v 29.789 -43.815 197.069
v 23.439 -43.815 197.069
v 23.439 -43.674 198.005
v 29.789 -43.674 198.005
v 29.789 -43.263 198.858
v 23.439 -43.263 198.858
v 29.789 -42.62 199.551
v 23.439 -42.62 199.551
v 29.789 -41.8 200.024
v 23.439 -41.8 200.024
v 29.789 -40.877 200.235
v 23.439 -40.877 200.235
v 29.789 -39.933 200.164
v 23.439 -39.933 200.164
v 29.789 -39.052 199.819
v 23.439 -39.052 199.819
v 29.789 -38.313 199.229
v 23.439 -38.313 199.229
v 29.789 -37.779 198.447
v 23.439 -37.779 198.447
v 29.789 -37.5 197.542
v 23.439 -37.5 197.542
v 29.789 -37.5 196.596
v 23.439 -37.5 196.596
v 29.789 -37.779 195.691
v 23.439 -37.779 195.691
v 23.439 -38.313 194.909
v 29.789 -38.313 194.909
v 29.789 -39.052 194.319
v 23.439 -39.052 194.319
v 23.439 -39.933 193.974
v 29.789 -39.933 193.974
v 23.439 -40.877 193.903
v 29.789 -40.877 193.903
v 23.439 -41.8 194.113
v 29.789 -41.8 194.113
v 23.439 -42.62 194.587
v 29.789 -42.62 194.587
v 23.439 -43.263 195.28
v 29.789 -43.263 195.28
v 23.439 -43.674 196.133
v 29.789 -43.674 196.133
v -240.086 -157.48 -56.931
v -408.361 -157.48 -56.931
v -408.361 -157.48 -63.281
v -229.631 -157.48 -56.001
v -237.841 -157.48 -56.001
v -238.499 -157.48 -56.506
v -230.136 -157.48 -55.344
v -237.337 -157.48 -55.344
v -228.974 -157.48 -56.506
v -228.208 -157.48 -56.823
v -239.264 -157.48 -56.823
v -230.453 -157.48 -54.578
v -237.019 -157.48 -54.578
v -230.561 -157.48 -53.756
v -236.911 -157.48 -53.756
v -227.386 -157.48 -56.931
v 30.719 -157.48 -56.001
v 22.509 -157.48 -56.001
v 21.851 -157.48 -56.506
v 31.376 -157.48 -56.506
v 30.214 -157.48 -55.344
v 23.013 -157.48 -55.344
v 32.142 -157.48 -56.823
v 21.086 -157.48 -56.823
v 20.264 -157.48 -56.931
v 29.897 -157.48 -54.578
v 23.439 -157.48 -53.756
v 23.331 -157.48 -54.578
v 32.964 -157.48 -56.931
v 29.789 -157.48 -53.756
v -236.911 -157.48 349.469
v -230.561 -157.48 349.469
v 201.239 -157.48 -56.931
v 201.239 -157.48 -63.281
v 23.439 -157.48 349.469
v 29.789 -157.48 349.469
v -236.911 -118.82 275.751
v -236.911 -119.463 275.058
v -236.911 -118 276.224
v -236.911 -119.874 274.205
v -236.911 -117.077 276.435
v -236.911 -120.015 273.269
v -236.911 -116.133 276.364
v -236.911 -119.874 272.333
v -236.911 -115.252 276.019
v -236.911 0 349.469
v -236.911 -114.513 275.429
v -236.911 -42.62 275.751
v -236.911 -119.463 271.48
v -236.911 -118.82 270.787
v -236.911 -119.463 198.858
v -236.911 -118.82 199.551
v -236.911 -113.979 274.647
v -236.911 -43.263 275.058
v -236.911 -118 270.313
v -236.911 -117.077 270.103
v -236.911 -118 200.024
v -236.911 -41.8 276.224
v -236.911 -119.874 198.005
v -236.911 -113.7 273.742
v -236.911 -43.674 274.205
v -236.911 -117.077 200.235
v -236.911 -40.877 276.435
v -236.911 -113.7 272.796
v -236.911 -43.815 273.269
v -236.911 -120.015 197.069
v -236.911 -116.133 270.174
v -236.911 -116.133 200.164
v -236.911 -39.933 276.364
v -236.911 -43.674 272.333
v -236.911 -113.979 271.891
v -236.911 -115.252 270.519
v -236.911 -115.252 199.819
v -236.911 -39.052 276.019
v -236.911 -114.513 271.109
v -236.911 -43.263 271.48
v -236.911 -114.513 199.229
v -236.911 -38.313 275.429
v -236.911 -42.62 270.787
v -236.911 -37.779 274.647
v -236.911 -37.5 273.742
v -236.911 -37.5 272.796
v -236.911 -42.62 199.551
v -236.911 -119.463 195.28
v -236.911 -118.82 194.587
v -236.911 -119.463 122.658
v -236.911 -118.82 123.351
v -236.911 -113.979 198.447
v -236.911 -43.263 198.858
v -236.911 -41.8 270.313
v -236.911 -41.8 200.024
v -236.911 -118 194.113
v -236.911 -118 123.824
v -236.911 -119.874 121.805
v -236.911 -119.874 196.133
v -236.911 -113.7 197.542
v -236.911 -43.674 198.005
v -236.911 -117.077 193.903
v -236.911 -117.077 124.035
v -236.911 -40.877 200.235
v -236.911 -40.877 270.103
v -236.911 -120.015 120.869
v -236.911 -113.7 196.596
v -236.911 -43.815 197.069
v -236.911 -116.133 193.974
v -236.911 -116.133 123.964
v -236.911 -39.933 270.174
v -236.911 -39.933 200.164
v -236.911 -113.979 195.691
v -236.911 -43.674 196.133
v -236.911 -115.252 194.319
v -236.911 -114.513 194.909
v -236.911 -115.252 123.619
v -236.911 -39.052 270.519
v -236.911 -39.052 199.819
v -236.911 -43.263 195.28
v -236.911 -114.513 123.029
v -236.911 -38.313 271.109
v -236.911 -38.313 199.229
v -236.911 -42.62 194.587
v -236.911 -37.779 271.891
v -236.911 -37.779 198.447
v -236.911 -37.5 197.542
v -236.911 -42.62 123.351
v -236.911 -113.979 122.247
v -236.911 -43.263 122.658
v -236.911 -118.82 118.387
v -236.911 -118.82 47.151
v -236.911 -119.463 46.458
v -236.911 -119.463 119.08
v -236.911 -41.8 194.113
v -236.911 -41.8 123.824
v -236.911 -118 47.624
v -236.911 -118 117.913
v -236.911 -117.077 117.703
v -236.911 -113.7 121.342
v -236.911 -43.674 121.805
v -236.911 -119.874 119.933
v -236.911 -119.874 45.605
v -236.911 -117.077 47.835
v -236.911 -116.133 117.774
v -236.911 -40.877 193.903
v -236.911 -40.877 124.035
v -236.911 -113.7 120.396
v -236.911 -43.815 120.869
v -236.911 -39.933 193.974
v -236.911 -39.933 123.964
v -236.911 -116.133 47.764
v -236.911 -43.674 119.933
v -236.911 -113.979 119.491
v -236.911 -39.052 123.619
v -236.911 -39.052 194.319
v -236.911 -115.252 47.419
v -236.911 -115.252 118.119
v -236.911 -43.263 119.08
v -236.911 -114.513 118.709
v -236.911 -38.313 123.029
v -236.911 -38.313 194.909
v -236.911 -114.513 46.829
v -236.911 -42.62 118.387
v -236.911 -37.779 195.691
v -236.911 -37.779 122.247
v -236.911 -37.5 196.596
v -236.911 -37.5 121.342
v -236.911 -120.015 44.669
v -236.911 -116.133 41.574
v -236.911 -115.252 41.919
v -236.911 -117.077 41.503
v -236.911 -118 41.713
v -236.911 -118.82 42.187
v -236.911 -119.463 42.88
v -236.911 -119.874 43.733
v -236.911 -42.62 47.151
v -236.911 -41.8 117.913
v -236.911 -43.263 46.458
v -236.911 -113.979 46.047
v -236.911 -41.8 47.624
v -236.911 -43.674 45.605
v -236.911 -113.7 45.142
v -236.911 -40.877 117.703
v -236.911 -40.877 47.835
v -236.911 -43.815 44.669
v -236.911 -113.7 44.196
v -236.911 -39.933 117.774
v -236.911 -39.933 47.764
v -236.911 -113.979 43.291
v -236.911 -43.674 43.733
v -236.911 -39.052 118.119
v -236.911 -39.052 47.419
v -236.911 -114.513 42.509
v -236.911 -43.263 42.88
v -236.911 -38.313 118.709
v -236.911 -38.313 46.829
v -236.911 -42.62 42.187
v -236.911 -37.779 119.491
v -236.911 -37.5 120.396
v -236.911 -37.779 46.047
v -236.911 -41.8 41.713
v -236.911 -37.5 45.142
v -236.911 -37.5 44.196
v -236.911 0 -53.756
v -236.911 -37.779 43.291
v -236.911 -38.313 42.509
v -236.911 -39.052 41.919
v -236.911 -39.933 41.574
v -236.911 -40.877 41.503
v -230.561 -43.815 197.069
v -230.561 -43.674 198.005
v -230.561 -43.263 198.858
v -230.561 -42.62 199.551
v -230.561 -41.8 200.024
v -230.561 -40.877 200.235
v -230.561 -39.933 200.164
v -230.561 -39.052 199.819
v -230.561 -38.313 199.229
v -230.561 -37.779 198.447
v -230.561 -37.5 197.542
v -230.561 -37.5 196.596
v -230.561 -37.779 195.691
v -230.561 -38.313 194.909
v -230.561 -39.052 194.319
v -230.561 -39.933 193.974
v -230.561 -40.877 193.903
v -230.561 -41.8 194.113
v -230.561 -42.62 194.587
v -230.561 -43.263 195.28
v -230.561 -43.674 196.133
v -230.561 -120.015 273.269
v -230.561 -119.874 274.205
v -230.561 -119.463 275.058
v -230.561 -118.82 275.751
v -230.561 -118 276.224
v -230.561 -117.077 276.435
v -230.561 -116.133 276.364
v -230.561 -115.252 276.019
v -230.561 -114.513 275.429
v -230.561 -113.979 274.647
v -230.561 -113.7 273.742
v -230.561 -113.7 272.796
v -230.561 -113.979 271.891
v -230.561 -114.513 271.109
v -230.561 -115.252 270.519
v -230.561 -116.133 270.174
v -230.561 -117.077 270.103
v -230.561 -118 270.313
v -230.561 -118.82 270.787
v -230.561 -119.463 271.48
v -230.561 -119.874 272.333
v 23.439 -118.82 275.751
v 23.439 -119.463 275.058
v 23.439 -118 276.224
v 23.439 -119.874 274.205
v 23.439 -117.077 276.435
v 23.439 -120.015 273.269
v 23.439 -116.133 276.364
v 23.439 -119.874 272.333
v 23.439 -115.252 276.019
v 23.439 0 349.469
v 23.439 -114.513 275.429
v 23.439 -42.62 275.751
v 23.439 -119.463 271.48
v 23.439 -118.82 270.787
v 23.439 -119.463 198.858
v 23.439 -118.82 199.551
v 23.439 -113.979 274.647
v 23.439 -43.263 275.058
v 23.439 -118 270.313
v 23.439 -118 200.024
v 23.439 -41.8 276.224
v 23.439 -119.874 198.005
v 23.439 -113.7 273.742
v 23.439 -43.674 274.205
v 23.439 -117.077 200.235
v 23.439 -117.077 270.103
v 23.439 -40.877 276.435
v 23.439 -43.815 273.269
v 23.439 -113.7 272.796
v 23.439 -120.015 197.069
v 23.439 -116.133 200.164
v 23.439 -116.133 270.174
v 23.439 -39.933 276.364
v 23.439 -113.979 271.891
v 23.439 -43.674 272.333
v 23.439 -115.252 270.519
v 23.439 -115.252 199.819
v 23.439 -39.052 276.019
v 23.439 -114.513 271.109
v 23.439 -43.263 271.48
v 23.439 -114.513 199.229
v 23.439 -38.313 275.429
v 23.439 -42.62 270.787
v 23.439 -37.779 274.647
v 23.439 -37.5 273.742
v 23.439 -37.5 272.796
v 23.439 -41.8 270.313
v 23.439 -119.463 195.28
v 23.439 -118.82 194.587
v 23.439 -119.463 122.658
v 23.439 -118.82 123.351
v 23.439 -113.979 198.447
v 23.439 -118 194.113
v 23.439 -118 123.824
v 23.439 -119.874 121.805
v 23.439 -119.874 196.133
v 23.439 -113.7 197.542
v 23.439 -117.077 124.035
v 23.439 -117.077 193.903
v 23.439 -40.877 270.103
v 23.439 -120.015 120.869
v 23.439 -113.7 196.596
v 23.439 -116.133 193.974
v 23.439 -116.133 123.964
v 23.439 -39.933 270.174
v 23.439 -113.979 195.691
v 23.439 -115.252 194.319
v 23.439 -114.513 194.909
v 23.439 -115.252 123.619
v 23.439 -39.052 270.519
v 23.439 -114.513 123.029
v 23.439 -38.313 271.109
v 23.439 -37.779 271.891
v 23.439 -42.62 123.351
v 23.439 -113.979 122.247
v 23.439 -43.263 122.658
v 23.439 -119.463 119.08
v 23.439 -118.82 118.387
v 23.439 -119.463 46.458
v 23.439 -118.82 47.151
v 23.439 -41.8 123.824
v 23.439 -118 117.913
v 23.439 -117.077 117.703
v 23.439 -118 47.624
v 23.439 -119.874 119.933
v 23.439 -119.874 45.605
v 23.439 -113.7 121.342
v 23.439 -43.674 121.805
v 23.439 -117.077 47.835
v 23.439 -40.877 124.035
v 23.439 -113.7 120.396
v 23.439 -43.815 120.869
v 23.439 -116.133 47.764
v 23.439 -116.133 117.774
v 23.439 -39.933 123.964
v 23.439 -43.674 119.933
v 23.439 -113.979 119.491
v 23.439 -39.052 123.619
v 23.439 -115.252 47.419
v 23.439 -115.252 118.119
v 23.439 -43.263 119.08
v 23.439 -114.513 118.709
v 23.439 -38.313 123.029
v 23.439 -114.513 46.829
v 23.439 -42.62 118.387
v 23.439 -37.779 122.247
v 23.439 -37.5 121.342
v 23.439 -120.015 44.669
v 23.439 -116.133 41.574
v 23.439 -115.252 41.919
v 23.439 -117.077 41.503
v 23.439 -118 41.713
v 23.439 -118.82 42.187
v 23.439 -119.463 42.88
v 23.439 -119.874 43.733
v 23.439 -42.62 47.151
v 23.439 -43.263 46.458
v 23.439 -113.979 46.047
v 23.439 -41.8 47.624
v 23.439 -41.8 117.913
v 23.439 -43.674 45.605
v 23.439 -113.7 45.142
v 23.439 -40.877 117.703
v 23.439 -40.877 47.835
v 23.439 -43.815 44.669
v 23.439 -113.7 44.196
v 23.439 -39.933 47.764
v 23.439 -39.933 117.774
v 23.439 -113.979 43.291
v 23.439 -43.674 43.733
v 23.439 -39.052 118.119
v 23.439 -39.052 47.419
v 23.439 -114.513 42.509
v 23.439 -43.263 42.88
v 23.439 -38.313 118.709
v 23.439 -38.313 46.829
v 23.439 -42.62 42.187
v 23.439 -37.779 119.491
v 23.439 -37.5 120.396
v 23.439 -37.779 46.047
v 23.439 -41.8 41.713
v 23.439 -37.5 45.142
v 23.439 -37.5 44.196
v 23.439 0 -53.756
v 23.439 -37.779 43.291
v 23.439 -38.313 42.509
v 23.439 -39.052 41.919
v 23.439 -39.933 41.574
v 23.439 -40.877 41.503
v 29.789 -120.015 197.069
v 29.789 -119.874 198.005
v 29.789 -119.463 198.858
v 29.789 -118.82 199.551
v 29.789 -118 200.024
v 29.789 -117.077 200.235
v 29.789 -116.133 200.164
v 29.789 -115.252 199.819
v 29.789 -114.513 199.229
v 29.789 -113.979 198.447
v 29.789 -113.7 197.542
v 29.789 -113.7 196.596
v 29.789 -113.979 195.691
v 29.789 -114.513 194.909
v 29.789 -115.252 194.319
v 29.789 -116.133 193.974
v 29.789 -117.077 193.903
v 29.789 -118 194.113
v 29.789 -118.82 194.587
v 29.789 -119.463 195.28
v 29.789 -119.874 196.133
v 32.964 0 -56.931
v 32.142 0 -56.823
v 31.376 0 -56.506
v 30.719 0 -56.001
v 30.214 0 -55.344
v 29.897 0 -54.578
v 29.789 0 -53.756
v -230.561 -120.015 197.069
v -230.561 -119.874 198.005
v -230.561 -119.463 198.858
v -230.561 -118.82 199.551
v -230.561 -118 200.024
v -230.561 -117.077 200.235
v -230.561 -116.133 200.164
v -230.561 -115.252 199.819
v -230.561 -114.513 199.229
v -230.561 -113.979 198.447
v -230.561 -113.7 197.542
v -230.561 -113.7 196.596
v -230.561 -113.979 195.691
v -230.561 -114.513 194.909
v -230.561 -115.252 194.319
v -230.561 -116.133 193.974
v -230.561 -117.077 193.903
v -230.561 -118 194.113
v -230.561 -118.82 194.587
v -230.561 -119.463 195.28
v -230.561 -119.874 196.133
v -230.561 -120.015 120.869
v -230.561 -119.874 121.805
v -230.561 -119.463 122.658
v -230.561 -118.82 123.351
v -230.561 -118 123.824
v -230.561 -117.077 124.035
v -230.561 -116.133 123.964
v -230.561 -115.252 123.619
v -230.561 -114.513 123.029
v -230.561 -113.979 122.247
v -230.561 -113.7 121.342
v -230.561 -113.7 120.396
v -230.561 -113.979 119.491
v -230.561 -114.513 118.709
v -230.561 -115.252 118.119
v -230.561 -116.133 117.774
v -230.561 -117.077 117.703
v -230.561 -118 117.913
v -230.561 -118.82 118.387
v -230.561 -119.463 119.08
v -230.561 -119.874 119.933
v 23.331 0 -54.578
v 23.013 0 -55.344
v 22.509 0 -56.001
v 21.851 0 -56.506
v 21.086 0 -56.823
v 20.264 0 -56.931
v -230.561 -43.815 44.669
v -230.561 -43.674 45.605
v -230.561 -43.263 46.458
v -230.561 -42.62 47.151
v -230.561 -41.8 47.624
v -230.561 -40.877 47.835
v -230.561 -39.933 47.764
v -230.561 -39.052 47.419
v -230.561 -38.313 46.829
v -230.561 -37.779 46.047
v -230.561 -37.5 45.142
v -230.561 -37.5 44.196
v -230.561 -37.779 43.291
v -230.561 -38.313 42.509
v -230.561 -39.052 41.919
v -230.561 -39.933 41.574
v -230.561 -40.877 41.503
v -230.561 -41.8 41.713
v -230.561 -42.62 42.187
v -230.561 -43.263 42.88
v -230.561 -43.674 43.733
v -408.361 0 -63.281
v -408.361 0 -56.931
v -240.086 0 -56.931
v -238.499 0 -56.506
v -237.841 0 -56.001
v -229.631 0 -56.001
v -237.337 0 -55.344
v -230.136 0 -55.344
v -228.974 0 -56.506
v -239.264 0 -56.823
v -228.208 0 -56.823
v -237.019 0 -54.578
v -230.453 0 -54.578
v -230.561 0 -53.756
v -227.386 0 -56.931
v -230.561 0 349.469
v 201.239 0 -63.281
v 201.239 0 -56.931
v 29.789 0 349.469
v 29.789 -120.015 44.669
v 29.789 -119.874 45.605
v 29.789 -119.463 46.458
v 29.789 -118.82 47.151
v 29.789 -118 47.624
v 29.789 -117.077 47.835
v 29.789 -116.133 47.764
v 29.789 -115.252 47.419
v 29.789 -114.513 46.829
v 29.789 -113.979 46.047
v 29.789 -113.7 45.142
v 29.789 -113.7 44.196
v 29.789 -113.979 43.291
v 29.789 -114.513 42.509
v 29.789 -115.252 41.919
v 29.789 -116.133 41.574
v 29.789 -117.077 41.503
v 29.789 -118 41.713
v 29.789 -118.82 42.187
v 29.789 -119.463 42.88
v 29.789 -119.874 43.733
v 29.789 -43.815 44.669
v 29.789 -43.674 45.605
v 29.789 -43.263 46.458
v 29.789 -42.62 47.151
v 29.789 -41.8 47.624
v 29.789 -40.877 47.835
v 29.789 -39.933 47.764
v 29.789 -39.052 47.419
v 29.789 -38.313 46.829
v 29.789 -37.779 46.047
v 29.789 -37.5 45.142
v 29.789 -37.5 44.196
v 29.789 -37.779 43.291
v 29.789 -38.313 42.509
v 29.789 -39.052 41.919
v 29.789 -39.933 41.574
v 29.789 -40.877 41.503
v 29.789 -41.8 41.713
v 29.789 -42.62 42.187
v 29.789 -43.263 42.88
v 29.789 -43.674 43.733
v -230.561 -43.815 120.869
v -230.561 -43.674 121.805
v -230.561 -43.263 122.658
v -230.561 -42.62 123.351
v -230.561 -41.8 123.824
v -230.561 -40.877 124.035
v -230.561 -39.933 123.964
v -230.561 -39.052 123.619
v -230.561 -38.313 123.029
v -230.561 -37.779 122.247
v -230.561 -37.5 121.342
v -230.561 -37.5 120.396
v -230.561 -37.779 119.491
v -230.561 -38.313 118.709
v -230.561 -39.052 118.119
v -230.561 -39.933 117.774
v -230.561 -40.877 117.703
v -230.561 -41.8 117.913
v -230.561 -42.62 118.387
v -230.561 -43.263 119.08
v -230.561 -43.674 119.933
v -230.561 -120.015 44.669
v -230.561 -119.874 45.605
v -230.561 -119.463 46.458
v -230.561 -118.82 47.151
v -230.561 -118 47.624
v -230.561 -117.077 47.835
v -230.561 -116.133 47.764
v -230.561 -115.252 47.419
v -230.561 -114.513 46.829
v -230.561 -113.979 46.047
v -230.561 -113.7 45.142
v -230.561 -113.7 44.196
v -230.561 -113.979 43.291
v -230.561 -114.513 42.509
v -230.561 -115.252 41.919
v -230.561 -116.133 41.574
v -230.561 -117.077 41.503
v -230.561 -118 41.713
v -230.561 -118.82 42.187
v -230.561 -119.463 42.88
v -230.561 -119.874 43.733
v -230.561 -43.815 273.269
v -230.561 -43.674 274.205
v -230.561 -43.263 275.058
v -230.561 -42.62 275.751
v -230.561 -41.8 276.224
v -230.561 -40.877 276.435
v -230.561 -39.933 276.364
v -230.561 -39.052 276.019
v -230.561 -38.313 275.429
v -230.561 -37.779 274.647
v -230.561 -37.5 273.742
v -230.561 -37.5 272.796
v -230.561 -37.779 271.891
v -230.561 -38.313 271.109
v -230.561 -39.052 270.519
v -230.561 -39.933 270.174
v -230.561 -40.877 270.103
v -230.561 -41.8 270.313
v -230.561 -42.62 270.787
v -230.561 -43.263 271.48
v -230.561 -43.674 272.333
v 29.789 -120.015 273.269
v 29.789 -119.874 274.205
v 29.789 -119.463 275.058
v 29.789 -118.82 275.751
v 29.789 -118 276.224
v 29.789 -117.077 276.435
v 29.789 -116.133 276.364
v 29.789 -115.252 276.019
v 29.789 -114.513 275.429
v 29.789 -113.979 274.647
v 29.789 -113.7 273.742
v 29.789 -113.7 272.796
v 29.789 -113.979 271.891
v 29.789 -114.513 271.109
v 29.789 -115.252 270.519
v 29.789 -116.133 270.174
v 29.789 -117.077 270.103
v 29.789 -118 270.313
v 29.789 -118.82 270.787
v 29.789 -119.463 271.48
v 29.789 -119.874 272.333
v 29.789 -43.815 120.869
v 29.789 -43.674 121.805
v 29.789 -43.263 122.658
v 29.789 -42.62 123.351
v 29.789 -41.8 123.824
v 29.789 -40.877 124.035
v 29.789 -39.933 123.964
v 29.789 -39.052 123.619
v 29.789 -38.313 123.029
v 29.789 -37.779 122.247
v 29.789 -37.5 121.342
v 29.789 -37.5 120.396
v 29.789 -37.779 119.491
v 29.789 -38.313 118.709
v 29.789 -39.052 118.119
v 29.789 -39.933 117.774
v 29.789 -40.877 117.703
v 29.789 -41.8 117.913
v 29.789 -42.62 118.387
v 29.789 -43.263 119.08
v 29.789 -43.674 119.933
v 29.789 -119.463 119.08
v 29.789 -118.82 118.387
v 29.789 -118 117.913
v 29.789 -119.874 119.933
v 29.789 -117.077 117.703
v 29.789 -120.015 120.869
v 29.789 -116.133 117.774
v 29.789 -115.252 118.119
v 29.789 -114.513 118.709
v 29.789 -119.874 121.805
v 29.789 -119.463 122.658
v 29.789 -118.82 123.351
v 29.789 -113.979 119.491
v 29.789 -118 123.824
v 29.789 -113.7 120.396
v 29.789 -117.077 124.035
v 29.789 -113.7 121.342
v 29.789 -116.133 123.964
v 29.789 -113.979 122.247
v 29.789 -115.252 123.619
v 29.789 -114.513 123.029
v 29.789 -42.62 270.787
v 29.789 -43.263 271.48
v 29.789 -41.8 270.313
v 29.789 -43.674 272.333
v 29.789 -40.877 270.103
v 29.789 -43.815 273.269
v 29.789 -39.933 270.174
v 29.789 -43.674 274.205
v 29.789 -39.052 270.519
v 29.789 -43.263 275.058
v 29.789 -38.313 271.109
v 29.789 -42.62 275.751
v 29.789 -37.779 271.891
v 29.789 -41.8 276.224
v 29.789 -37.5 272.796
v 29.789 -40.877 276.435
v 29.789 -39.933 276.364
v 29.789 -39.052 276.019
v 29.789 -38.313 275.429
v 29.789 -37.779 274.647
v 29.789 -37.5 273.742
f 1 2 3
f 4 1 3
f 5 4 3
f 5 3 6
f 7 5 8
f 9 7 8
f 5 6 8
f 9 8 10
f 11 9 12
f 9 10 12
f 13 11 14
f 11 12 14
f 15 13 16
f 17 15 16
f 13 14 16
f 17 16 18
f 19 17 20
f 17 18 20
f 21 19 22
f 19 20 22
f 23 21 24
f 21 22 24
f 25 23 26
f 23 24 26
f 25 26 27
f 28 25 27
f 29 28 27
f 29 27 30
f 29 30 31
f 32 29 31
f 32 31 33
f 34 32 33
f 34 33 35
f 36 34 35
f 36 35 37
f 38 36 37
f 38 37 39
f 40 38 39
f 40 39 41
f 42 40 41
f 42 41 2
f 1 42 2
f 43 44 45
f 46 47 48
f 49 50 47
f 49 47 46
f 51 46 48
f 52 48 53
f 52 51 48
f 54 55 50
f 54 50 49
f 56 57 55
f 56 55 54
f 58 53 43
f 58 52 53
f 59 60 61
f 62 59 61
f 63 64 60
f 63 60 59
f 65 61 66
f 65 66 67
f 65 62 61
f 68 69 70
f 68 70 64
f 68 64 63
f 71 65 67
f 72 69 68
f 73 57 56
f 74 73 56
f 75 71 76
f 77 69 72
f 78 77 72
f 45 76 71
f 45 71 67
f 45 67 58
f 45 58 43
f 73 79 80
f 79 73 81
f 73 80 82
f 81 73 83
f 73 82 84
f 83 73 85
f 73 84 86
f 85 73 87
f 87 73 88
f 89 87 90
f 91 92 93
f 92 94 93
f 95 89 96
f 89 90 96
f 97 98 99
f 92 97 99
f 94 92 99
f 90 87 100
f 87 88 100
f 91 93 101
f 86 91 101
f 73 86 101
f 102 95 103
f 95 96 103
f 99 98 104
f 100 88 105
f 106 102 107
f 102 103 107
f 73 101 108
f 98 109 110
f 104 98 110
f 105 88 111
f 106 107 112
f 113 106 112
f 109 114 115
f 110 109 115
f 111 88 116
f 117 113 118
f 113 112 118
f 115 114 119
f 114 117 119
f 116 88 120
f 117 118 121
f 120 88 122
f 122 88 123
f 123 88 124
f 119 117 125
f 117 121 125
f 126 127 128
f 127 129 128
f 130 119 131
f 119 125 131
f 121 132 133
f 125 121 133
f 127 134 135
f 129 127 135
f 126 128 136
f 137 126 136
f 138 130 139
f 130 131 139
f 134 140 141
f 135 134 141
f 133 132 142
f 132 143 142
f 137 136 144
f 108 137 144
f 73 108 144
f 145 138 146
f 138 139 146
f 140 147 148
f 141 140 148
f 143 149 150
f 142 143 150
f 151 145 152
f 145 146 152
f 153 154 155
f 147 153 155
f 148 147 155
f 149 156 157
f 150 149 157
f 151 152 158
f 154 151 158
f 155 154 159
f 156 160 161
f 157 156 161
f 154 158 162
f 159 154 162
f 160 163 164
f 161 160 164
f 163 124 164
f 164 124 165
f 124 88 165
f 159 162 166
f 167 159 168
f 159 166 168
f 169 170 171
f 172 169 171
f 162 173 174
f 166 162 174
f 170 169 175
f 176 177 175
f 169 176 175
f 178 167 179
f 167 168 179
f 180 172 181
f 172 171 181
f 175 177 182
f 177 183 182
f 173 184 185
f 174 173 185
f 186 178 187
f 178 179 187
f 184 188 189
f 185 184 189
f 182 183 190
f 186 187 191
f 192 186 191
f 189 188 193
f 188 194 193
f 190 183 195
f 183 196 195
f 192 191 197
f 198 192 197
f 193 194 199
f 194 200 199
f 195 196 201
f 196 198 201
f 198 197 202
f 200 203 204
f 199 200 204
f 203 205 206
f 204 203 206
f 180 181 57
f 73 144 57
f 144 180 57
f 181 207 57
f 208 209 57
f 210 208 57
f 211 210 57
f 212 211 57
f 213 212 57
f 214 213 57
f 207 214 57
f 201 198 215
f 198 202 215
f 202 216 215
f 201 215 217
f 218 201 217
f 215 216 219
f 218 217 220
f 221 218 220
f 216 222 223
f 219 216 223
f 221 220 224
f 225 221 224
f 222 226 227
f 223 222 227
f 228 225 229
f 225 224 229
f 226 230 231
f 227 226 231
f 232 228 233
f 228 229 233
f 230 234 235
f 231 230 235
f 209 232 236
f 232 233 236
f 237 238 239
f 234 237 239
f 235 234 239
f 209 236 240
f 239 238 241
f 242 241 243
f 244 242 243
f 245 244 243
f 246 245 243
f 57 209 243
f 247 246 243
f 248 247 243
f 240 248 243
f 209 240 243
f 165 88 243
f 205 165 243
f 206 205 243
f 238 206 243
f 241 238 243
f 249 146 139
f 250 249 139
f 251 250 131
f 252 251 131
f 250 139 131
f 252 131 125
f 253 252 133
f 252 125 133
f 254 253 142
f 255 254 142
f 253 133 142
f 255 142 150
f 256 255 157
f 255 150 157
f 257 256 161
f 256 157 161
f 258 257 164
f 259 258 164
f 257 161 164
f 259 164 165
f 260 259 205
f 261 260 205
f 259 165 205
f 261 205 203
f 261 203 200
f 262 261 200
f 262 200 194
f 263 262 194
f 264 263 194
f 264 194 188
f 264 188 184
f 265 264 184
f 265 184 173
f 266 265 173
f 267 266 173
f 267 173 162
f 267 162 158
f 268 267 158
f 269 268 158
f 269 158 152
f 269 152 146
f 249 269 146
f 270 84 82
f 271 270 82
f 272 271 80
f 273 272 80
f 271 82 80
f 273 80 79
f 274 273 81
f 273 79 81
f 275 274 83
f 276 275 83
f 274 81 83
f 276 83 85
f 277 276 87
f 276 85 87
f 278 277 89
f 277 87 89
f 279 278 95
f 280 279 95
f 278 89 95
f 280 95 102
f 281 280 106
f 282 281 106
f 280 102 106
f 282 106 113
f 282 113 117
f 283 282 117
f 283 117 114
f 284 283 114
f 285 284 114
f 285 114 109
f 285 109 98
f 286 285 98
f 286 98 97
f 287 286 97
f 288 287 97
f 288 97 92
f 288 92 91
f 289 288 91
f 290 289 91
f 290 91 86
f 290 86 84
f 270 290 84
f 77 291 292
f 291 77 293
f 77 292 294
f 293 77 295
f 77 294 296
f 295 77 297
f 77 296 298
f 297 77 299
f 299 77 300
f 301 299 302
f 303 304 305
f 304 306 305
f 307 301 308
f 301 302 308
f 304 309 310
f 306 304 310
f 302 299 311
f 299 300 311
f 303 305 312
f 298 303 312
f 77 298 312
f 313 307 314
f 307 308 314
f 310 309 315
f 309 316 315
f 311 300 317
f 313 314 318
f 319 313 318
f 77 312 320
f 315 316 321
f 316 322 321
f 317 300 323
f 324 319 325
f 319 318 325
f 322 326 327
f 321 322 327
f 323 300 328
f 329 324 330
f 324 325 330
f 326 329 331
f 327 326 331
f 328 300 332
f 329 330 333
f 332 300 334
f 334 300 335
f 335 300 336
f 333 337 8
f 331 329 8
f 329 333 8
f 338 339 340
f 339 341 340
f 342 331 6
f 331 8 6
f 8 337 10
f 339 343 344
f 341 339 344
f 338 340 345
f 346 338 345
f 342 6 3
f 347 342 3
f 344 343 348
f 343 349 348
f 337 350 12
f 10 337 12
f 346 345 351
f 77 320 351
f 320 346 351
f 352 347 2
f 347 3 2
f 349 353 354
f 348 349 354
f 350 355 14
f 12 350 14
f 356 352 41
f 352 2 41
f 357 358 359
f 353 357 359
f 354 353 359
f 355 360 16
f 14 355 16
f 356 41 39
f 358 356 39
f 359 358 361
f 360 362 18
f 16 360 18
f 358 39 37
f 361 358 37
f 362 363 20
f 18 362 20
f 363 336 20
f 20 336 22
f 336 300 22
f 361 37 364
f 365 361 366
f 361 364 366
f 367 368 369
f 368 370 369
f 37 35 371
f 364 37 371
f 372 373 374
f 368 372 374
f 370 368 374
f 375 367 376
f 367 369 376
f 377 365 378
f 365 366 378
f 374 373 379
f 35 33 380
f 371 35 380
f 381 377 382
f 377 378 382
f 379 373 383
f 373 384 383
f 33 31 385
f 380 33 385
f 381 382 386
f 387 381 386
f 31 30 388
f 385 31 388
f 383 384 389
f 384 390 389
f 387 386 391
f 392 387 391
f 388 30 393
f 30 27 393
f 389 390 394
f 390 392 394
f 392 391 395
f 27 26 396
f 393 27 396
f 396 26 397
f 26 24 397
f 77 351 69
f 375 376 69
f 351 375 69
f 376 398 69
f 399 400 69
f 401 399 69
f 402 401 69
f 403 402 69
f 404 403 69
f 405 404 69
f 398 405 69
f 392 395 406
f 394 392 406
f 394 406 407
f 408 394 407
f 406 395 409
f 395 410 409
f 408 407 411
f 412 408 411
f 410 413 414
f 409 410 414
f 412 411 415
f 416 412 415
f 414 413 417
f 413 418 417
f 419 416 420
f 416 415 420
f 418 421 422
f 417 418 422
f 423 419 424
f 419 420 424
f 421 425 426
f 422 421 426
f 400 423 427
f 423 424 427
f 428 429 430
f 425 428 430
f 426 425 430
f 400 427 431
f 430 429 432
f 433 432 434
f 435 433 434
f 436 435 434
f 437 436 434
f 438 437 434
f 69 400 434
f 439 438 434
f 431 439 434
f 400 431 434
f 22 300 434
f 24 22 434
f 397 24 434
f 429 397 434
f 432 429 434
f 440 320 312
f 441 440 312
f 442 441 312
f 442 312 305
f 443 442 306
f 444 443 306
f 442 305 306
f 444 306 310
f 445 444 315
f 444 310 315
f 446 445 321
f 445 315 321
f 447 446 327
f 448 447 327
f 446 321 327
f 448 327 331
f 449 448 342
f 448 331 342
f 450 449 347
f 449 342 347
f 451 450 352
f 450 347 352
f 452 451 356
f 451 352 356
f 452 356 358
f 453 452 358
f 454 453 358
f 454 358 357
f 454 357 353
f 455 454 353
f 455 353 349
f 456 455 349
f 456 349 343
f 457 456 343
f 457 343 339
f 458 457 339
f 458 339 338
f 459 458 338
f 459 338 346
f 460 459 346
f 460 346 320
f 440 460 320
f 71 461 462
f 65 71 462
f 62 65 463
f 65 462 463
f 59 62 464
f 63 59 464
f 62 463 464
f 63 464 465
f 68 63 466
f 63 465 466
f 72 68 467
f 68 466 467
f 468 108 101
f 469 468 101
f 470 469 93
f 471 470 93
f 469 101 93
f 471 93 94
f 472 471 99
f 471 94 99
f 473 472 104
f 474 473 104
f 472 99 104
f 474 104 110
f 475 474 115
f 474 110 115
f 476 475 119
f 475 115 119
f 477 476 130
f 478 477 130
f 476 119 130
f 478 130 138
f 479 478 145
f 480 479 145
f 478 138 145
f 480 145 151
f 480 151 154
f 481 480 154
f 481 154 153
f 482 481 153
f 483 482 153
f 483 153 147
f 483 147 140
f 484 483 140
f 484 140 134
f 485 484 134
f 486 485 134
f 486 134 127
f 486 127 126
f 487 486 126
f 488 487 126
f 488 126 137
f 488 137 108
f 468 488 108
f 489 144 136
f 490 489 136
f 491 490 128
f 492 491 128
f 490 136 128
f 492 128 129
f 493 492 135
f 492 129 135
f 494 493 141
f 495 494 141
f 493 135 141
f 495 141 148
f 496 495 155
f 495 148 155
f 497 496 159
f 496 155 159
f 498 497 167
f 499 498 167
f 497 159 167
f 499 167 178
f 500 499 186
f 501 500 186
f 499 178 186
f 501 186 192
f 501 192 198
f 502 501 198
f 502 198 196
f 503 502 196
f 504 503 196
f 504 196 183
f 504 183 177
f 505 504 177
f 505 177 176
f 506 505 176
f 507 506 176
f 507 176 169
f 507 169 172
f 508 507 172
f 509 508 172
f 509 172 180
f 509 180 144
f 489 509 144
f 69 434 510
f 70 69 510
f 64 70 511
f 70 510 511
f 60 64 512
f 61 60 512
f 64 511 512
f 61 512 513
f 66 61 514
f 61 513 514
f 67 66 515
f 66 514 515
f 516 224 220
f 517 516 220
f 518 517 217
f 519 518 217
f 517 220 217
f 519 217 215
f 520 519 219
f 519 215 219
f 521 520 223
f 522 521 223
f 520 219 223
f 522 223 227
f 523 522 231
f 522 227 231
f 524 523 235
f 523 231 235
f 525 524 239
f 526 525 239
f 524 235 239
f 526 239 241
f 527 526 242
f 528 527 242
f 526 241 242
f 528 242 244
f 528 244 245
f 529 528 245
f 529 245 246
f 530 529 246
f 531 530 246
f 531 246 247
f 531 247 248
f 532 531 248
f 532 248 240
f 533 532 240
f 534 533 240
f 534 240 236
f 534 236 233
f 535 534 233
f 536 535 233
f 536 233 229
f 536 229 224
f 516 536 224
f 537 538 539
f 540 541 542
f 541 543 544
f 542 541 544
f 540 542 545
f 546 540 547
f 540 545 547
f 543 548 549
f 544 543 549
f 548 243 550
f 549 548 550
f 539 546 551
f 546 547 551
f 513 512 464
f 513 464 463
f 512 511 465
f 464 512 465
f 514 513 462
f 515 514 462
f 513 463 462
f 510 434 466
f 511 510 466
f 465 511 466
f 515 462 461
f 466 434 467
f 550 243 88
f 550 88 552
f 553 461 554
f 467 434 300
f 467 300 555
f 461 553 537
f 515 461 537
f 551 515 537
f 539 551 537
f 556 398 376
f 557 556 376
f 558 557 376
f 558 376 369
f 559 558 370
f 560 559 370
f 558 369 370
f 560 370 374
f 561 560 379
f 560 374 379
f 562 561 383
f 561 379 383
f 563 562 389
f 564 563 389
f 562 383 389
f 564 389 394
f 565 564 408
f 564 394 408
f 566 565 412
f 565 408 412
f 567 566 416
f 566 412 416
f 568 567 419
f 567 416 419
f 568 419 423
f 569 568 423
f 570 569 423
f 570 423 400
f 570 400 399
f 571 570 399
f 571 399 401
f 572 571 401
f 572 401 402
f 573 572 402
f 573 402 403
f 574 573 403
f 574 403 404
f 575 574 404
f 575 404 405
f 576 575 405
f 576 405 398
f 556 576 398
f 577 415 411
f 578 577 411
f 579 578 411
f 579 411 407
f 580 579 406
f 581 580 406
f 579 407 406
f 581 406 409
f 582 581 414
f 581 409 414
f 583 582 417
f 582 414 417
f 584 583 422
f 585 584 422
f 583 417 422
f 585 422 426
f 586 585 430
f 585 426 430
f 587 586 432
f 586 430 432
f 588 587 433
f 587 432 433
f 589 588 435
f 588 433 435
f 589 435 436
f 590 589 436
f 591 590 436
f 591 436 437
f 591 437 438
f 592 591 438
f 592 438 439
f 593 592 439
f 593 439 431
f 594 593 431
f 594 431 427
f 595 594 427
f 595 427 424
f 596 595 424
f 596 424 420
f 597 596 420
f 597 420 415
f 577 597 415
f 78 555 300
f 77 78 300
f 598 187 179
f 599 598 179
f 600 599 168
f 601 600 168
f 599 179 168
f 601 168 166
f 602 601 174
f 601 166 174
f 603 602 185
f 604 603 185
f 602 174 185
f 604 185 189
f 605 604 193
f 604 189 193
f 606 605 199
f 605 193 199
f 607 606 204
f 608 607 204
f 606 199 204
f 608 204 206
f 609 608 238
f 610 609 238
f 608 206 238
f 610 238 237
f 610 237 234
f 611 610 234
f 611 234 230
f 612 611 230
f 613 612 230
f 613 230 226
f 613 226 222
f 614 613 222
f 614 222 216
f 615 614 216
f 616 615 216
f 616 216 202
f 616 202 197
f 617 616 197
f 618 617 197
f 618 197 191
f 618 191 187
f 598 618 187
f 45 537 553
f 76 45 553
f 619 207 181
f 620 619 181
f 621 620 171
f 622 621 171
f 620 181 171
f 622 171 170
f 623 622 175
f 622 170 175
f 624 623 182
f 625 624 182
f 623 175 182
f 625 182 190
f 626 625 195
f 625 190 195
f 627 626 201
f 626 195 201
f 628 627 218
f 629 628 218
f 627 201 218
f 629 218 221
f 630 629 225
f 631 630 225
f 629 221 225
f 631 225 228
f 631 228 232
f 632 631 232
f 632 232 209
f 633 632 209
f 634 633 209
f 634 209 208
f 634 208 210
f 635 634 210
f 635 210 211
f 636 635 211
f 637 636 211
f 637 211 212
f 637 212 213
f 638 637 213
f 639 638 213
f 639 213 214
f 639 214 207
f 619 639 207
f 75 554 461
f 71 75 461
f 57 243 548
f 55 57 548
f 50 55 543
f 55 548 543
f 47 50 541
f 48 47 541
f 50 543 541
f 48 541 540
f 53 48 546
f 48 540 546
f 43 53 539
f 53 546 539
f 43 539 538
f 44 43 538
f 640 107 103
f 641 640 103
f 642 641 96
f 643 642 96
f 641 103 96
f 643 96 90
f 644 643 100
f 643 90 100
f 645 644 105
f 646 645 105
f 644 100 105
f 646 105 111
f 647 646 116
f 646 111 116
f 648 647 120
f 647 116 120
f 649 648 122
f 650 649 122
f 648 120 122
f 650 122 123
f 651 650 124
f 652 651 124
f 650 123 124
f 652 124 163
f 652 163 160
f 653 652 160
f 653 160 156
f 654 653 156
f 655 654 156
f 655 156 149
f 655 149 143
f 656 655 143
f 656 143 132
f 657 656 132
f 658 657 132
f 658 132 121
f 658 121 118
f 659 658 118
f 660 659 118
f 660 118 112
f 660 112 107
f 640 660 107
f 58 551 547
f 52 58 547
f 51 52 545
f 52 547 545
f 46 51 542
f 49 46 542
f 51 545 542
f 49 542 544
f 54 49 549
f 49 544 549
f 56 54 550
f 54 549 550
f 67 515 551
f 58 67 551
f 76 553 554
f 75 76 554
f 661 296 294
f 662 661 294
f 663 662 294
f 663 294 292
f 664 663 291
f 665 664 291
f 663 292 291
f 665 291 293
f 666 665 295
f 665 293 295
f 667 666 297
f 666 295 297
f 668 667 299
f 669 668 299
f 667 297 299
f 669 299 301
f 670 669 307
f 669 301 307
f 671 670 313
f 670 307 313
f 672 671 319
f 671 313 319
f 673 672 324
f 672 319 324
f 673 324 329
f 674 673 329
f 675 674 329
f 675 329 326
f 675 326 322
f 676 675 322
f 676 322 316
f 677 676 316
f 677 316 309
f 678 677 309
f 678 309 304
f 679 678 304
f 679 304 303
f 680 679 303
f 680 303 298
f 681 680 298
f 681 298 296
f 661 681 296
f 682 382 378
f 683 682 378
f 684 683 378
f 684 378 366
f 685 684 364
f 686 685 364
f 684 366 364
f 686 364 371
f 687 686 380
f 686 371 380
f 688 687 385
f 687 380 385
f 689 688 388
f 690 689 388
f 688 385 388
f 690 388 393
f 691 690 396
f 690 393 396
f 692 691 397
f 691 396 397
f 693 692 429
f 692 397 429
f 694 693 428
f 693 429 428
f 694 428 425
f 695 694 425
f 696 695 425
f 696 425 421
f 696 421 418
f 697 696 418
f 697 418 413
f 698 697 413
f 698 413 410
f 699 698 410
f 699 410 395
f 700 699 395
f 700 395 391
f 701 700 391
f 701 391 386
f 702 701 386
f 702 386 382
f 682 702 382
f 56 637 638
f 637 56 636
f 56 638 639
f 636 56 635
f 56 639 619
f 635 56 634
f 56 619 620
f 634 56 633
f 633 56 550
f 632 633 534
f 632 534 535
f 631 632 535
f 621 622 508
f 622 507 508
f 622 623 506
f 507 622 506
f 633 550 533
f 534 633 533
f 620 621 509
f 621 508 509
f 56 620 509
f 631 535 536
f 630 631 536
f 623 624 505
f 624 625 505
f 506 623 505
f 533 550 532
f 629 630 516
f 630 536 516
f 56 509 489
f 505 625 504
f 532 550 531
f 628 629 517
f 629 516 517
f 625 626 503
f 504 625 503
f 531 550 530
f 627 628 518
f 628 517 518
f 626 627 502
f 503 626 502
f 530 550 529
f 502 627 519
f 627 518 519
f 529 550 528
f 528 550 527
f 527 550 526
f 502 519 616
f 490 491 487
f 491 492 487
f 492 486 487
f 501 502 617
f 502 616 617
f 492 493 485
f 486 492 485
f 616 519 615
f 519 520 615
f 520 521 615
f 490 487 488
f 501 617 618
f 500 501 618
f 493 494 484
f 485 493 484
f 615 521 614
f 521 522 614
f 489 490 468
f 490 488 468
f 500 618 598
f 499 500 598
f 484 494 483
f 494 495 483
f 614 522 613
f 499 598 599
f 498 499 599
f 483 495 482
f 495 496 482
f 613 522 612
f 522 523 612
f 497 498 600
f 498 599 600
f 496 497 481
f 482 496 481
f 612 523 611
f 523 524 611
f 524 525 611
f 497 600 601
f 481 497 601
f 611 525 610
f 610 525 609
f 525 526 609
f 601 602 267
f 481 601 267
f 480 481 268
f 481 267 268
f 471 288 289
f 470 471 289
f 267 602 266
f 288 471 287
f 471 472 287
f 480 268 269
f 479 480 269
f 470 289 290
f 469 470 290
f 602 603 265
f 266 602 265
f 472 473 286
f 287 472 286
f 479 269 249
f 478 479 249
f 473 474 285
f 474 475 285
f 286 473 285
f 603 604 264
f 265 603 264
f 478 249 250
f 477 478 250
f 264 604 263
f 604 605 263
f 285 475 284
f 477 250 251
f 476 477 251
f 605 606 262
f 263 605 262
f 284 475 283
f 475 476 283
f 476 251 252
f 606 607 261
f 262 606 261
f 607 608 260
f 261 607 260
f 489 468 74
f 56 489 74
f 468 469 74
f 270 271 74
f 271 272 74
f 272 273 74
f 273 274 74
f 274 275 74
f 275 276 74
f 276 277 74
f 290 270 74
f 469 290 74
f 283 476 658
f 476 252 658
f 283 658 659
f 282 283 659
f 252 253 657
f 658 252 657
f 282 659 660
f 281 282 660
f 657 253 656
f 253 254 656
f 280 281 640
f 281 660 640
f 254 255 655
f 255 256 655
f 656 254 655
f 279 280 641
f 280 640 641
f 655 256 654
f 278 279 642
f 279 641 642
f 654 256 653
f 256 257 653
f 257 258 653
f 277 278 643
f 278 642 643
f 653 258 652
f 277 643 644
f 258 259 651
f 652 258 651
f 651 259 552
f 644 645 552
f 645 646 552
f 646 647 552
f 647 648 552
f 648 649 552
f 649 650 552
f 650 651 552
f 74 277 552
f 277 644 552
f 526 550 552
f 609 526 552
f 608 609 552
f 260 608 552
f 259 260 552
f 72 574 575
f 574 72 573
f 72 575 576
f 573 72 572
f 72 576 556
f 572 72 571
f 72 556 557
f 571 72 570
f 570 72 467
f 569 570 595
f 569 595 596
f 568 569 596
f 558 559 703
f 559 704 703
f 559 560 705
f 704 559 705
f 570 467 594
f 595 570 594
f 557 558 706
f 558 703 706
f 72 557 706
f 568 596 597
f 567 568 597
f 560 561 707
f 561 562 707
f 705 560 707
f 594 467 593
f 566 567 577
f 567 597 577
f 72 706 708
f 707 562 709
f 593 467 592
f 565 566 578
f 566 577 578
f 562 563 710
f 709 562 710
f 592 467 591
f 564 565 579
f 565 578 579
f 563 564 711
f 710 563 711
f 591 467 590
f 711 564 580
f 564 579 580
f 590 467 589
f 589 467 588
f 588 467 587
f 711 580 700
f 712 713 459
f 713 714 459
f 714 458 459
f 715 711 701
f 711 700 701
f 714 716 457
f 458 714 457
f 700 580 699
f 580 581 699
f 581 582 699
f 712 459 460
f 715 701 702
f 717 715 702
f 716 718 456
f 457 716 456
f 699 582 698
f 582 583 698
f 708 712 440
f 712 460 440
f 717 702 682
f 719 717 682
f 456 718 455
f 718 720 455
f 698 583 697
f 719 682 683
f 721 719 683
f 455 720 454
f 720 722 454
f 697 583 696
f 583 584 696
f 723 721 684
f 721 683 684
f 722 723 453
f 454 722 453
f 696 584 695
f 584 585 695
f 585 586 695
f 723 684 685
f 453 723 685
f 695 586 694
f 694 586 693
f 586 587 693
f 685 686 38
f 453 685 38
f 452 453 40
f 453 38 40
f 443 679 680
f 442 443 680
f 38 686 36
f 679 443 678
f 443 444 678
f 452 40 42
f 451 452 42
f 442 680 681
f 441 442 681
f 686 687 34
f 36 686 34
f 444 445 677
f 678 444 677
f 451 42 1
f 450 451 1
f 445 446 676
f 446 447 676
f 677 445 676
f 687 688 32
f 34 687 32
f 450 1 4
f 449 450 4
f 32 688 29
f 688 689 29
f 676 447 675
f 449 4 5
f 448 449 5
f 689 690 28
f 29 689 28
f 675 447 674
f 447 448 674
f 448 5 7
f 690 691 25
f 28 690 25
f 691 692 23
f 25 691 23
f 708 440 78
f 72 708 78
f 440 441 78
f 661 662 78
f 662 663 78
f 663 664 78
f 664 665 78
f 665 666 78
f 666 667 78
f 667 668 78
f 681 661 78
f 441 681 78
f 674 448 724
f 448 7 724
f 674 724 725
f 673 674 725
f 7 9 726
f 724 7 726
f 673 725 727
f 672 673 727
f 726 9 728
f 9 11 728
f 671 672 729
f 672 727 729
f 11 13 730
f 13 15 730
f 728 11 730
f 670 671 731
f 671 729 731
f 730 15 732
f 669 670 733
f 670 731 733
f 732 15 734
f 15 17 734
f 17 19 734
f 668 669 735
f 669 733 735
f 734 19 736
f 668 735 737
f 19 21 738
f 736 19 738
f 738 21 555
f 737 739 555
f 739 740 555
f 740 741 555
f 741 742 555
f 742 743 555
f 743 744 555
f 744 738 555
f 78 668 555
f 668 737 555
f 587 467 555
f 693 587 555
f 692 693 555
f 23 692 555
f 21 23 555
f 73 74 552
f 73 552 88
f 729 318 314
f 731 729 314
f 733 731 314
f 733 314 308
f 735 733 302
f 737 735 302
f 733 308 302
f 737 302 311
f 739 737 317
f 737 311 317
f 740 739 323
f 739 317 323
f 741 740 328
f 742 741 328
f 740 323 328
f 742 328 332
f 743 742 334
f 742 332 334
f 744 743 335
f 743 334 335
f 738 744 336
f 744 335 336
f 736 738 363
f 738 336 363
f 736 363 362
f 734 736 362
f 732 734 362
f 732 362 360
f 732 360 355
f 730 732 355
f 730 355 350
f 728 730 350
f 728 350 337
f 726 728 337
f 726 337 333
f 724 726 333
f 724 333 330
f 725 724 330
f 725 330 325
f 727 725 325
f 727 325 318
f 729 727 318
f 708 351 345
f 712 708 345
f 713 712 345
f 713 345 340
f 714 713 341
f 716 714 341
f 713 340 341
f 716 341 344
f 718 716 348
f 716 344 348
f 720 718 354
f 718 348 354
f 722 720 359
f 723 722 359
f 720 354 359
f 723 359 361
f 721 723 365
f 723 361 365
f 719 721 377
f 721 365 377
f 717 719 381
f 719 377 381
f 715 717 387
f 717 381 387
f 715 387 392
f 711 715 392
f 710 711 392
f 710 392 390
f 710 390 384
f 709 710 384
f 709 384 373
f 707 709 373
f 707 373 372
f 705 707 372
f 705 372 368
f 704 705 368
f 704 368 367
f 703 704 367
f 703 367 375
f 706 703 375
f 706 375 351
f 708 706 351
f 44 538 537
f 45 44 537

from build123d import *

# Parameters (mm, degrees)
F1_DEPTH = 157.48
F2_R     = 3.175
F3_DEPTH = 438.151


with BuildPart() as f1:
    # F0 (on Front) → F1 (new body)
    with BuildSketch(Plane.XZ):
        with BuildLine():
            Line((-103.561188, -56.931033), (-103.561188, -63.281033))
            Line((-103.561188, -63.281033), (201.238812, -63.281033))
            Line((201.238812, -63.281033), (201.238812, -56.931033))
            Line((201.238812, -56.931033), (32.963812, -56.931033))
            ThreePointArc((32.963812, -56.931033), (30.718748, -56.001097), (29.788812, -53.756033))
            Line((29.788812, -53.756033), (29.788812, 349.468967))
            Line((29.788812, 349.468967), (23.438812, 349.468967))
            Line((23.438812, 349.468967), (23.438812, -53.756033))
            ThreePointArc((23.438812, -53.756033), (22.508876, -56.001097), (20.263812, -56.931033))
            Line((20.263812, -56.931033), (-103.561188, -56.931033))
        make_face()
        with BuildLine():
            Line((-408.361188, -63.281033), (-103.561188, -63.281033))
            Line((-103.561188, -63.281033), (-103.561188, -56.931033))
            Line((-103.561188, -56.931033), (-227.386188, -56.931033))
            ThreePointArc((-227.386188, -56.931033), (-229.631252, -56.001097), (-230.561188, -53.756033))
            Line((-230.561188, -53.756033), (-230.561188, 349.468967))
            Line((-230.561188, 349.468967), (-236.911188, 349.468967))
            Line((-236.911188, 349.468967), (-236.911188, -53.756033))
            ThreePointArc((-236.911188, -53.756033), (-237.841124, -56.001097), (-240.086188, -56.931033))
            Line((-240.086188, -56.931033), (-408.361188, -56.931033))
            Line((-408.361188, -56.931033), (-408.361188, -63.281033))
        make_face()
    extrude(amount=F1_DEPTH)

    # F2 (on face) → F3 (cut, through all)
    with BuildSketch(Plane(origin=(-236.911188, 0, 0), x_dir=(0, -1, 0), z_dir=(-1, 0, 0))):
        with Locations((40.64, 273.268967)):
            Circle(F2_R)
        with Locations((40.64, 197.068967)):
            Circle(F2_R)
        with Locations((40.64, 120.868967)):
            Circle(F2_R)
        with Locations((40.64, 44.668967)):
            Circle(F2_R)
        with Locations((116.84, 44.668967)):
            Circle(F2_R)
        with Locations((116.84, 120.868967)):
            Circle(F2_R)
        with Locations((116.84, 197.068967)):
            Circle(F2_R)
        with Locations((116.84, 273.268967)):
            Circle(F2_R)
    extrude(amount=-F3_DEPTH, mode=Mode.SUBTRACT)


solid = f1.part
